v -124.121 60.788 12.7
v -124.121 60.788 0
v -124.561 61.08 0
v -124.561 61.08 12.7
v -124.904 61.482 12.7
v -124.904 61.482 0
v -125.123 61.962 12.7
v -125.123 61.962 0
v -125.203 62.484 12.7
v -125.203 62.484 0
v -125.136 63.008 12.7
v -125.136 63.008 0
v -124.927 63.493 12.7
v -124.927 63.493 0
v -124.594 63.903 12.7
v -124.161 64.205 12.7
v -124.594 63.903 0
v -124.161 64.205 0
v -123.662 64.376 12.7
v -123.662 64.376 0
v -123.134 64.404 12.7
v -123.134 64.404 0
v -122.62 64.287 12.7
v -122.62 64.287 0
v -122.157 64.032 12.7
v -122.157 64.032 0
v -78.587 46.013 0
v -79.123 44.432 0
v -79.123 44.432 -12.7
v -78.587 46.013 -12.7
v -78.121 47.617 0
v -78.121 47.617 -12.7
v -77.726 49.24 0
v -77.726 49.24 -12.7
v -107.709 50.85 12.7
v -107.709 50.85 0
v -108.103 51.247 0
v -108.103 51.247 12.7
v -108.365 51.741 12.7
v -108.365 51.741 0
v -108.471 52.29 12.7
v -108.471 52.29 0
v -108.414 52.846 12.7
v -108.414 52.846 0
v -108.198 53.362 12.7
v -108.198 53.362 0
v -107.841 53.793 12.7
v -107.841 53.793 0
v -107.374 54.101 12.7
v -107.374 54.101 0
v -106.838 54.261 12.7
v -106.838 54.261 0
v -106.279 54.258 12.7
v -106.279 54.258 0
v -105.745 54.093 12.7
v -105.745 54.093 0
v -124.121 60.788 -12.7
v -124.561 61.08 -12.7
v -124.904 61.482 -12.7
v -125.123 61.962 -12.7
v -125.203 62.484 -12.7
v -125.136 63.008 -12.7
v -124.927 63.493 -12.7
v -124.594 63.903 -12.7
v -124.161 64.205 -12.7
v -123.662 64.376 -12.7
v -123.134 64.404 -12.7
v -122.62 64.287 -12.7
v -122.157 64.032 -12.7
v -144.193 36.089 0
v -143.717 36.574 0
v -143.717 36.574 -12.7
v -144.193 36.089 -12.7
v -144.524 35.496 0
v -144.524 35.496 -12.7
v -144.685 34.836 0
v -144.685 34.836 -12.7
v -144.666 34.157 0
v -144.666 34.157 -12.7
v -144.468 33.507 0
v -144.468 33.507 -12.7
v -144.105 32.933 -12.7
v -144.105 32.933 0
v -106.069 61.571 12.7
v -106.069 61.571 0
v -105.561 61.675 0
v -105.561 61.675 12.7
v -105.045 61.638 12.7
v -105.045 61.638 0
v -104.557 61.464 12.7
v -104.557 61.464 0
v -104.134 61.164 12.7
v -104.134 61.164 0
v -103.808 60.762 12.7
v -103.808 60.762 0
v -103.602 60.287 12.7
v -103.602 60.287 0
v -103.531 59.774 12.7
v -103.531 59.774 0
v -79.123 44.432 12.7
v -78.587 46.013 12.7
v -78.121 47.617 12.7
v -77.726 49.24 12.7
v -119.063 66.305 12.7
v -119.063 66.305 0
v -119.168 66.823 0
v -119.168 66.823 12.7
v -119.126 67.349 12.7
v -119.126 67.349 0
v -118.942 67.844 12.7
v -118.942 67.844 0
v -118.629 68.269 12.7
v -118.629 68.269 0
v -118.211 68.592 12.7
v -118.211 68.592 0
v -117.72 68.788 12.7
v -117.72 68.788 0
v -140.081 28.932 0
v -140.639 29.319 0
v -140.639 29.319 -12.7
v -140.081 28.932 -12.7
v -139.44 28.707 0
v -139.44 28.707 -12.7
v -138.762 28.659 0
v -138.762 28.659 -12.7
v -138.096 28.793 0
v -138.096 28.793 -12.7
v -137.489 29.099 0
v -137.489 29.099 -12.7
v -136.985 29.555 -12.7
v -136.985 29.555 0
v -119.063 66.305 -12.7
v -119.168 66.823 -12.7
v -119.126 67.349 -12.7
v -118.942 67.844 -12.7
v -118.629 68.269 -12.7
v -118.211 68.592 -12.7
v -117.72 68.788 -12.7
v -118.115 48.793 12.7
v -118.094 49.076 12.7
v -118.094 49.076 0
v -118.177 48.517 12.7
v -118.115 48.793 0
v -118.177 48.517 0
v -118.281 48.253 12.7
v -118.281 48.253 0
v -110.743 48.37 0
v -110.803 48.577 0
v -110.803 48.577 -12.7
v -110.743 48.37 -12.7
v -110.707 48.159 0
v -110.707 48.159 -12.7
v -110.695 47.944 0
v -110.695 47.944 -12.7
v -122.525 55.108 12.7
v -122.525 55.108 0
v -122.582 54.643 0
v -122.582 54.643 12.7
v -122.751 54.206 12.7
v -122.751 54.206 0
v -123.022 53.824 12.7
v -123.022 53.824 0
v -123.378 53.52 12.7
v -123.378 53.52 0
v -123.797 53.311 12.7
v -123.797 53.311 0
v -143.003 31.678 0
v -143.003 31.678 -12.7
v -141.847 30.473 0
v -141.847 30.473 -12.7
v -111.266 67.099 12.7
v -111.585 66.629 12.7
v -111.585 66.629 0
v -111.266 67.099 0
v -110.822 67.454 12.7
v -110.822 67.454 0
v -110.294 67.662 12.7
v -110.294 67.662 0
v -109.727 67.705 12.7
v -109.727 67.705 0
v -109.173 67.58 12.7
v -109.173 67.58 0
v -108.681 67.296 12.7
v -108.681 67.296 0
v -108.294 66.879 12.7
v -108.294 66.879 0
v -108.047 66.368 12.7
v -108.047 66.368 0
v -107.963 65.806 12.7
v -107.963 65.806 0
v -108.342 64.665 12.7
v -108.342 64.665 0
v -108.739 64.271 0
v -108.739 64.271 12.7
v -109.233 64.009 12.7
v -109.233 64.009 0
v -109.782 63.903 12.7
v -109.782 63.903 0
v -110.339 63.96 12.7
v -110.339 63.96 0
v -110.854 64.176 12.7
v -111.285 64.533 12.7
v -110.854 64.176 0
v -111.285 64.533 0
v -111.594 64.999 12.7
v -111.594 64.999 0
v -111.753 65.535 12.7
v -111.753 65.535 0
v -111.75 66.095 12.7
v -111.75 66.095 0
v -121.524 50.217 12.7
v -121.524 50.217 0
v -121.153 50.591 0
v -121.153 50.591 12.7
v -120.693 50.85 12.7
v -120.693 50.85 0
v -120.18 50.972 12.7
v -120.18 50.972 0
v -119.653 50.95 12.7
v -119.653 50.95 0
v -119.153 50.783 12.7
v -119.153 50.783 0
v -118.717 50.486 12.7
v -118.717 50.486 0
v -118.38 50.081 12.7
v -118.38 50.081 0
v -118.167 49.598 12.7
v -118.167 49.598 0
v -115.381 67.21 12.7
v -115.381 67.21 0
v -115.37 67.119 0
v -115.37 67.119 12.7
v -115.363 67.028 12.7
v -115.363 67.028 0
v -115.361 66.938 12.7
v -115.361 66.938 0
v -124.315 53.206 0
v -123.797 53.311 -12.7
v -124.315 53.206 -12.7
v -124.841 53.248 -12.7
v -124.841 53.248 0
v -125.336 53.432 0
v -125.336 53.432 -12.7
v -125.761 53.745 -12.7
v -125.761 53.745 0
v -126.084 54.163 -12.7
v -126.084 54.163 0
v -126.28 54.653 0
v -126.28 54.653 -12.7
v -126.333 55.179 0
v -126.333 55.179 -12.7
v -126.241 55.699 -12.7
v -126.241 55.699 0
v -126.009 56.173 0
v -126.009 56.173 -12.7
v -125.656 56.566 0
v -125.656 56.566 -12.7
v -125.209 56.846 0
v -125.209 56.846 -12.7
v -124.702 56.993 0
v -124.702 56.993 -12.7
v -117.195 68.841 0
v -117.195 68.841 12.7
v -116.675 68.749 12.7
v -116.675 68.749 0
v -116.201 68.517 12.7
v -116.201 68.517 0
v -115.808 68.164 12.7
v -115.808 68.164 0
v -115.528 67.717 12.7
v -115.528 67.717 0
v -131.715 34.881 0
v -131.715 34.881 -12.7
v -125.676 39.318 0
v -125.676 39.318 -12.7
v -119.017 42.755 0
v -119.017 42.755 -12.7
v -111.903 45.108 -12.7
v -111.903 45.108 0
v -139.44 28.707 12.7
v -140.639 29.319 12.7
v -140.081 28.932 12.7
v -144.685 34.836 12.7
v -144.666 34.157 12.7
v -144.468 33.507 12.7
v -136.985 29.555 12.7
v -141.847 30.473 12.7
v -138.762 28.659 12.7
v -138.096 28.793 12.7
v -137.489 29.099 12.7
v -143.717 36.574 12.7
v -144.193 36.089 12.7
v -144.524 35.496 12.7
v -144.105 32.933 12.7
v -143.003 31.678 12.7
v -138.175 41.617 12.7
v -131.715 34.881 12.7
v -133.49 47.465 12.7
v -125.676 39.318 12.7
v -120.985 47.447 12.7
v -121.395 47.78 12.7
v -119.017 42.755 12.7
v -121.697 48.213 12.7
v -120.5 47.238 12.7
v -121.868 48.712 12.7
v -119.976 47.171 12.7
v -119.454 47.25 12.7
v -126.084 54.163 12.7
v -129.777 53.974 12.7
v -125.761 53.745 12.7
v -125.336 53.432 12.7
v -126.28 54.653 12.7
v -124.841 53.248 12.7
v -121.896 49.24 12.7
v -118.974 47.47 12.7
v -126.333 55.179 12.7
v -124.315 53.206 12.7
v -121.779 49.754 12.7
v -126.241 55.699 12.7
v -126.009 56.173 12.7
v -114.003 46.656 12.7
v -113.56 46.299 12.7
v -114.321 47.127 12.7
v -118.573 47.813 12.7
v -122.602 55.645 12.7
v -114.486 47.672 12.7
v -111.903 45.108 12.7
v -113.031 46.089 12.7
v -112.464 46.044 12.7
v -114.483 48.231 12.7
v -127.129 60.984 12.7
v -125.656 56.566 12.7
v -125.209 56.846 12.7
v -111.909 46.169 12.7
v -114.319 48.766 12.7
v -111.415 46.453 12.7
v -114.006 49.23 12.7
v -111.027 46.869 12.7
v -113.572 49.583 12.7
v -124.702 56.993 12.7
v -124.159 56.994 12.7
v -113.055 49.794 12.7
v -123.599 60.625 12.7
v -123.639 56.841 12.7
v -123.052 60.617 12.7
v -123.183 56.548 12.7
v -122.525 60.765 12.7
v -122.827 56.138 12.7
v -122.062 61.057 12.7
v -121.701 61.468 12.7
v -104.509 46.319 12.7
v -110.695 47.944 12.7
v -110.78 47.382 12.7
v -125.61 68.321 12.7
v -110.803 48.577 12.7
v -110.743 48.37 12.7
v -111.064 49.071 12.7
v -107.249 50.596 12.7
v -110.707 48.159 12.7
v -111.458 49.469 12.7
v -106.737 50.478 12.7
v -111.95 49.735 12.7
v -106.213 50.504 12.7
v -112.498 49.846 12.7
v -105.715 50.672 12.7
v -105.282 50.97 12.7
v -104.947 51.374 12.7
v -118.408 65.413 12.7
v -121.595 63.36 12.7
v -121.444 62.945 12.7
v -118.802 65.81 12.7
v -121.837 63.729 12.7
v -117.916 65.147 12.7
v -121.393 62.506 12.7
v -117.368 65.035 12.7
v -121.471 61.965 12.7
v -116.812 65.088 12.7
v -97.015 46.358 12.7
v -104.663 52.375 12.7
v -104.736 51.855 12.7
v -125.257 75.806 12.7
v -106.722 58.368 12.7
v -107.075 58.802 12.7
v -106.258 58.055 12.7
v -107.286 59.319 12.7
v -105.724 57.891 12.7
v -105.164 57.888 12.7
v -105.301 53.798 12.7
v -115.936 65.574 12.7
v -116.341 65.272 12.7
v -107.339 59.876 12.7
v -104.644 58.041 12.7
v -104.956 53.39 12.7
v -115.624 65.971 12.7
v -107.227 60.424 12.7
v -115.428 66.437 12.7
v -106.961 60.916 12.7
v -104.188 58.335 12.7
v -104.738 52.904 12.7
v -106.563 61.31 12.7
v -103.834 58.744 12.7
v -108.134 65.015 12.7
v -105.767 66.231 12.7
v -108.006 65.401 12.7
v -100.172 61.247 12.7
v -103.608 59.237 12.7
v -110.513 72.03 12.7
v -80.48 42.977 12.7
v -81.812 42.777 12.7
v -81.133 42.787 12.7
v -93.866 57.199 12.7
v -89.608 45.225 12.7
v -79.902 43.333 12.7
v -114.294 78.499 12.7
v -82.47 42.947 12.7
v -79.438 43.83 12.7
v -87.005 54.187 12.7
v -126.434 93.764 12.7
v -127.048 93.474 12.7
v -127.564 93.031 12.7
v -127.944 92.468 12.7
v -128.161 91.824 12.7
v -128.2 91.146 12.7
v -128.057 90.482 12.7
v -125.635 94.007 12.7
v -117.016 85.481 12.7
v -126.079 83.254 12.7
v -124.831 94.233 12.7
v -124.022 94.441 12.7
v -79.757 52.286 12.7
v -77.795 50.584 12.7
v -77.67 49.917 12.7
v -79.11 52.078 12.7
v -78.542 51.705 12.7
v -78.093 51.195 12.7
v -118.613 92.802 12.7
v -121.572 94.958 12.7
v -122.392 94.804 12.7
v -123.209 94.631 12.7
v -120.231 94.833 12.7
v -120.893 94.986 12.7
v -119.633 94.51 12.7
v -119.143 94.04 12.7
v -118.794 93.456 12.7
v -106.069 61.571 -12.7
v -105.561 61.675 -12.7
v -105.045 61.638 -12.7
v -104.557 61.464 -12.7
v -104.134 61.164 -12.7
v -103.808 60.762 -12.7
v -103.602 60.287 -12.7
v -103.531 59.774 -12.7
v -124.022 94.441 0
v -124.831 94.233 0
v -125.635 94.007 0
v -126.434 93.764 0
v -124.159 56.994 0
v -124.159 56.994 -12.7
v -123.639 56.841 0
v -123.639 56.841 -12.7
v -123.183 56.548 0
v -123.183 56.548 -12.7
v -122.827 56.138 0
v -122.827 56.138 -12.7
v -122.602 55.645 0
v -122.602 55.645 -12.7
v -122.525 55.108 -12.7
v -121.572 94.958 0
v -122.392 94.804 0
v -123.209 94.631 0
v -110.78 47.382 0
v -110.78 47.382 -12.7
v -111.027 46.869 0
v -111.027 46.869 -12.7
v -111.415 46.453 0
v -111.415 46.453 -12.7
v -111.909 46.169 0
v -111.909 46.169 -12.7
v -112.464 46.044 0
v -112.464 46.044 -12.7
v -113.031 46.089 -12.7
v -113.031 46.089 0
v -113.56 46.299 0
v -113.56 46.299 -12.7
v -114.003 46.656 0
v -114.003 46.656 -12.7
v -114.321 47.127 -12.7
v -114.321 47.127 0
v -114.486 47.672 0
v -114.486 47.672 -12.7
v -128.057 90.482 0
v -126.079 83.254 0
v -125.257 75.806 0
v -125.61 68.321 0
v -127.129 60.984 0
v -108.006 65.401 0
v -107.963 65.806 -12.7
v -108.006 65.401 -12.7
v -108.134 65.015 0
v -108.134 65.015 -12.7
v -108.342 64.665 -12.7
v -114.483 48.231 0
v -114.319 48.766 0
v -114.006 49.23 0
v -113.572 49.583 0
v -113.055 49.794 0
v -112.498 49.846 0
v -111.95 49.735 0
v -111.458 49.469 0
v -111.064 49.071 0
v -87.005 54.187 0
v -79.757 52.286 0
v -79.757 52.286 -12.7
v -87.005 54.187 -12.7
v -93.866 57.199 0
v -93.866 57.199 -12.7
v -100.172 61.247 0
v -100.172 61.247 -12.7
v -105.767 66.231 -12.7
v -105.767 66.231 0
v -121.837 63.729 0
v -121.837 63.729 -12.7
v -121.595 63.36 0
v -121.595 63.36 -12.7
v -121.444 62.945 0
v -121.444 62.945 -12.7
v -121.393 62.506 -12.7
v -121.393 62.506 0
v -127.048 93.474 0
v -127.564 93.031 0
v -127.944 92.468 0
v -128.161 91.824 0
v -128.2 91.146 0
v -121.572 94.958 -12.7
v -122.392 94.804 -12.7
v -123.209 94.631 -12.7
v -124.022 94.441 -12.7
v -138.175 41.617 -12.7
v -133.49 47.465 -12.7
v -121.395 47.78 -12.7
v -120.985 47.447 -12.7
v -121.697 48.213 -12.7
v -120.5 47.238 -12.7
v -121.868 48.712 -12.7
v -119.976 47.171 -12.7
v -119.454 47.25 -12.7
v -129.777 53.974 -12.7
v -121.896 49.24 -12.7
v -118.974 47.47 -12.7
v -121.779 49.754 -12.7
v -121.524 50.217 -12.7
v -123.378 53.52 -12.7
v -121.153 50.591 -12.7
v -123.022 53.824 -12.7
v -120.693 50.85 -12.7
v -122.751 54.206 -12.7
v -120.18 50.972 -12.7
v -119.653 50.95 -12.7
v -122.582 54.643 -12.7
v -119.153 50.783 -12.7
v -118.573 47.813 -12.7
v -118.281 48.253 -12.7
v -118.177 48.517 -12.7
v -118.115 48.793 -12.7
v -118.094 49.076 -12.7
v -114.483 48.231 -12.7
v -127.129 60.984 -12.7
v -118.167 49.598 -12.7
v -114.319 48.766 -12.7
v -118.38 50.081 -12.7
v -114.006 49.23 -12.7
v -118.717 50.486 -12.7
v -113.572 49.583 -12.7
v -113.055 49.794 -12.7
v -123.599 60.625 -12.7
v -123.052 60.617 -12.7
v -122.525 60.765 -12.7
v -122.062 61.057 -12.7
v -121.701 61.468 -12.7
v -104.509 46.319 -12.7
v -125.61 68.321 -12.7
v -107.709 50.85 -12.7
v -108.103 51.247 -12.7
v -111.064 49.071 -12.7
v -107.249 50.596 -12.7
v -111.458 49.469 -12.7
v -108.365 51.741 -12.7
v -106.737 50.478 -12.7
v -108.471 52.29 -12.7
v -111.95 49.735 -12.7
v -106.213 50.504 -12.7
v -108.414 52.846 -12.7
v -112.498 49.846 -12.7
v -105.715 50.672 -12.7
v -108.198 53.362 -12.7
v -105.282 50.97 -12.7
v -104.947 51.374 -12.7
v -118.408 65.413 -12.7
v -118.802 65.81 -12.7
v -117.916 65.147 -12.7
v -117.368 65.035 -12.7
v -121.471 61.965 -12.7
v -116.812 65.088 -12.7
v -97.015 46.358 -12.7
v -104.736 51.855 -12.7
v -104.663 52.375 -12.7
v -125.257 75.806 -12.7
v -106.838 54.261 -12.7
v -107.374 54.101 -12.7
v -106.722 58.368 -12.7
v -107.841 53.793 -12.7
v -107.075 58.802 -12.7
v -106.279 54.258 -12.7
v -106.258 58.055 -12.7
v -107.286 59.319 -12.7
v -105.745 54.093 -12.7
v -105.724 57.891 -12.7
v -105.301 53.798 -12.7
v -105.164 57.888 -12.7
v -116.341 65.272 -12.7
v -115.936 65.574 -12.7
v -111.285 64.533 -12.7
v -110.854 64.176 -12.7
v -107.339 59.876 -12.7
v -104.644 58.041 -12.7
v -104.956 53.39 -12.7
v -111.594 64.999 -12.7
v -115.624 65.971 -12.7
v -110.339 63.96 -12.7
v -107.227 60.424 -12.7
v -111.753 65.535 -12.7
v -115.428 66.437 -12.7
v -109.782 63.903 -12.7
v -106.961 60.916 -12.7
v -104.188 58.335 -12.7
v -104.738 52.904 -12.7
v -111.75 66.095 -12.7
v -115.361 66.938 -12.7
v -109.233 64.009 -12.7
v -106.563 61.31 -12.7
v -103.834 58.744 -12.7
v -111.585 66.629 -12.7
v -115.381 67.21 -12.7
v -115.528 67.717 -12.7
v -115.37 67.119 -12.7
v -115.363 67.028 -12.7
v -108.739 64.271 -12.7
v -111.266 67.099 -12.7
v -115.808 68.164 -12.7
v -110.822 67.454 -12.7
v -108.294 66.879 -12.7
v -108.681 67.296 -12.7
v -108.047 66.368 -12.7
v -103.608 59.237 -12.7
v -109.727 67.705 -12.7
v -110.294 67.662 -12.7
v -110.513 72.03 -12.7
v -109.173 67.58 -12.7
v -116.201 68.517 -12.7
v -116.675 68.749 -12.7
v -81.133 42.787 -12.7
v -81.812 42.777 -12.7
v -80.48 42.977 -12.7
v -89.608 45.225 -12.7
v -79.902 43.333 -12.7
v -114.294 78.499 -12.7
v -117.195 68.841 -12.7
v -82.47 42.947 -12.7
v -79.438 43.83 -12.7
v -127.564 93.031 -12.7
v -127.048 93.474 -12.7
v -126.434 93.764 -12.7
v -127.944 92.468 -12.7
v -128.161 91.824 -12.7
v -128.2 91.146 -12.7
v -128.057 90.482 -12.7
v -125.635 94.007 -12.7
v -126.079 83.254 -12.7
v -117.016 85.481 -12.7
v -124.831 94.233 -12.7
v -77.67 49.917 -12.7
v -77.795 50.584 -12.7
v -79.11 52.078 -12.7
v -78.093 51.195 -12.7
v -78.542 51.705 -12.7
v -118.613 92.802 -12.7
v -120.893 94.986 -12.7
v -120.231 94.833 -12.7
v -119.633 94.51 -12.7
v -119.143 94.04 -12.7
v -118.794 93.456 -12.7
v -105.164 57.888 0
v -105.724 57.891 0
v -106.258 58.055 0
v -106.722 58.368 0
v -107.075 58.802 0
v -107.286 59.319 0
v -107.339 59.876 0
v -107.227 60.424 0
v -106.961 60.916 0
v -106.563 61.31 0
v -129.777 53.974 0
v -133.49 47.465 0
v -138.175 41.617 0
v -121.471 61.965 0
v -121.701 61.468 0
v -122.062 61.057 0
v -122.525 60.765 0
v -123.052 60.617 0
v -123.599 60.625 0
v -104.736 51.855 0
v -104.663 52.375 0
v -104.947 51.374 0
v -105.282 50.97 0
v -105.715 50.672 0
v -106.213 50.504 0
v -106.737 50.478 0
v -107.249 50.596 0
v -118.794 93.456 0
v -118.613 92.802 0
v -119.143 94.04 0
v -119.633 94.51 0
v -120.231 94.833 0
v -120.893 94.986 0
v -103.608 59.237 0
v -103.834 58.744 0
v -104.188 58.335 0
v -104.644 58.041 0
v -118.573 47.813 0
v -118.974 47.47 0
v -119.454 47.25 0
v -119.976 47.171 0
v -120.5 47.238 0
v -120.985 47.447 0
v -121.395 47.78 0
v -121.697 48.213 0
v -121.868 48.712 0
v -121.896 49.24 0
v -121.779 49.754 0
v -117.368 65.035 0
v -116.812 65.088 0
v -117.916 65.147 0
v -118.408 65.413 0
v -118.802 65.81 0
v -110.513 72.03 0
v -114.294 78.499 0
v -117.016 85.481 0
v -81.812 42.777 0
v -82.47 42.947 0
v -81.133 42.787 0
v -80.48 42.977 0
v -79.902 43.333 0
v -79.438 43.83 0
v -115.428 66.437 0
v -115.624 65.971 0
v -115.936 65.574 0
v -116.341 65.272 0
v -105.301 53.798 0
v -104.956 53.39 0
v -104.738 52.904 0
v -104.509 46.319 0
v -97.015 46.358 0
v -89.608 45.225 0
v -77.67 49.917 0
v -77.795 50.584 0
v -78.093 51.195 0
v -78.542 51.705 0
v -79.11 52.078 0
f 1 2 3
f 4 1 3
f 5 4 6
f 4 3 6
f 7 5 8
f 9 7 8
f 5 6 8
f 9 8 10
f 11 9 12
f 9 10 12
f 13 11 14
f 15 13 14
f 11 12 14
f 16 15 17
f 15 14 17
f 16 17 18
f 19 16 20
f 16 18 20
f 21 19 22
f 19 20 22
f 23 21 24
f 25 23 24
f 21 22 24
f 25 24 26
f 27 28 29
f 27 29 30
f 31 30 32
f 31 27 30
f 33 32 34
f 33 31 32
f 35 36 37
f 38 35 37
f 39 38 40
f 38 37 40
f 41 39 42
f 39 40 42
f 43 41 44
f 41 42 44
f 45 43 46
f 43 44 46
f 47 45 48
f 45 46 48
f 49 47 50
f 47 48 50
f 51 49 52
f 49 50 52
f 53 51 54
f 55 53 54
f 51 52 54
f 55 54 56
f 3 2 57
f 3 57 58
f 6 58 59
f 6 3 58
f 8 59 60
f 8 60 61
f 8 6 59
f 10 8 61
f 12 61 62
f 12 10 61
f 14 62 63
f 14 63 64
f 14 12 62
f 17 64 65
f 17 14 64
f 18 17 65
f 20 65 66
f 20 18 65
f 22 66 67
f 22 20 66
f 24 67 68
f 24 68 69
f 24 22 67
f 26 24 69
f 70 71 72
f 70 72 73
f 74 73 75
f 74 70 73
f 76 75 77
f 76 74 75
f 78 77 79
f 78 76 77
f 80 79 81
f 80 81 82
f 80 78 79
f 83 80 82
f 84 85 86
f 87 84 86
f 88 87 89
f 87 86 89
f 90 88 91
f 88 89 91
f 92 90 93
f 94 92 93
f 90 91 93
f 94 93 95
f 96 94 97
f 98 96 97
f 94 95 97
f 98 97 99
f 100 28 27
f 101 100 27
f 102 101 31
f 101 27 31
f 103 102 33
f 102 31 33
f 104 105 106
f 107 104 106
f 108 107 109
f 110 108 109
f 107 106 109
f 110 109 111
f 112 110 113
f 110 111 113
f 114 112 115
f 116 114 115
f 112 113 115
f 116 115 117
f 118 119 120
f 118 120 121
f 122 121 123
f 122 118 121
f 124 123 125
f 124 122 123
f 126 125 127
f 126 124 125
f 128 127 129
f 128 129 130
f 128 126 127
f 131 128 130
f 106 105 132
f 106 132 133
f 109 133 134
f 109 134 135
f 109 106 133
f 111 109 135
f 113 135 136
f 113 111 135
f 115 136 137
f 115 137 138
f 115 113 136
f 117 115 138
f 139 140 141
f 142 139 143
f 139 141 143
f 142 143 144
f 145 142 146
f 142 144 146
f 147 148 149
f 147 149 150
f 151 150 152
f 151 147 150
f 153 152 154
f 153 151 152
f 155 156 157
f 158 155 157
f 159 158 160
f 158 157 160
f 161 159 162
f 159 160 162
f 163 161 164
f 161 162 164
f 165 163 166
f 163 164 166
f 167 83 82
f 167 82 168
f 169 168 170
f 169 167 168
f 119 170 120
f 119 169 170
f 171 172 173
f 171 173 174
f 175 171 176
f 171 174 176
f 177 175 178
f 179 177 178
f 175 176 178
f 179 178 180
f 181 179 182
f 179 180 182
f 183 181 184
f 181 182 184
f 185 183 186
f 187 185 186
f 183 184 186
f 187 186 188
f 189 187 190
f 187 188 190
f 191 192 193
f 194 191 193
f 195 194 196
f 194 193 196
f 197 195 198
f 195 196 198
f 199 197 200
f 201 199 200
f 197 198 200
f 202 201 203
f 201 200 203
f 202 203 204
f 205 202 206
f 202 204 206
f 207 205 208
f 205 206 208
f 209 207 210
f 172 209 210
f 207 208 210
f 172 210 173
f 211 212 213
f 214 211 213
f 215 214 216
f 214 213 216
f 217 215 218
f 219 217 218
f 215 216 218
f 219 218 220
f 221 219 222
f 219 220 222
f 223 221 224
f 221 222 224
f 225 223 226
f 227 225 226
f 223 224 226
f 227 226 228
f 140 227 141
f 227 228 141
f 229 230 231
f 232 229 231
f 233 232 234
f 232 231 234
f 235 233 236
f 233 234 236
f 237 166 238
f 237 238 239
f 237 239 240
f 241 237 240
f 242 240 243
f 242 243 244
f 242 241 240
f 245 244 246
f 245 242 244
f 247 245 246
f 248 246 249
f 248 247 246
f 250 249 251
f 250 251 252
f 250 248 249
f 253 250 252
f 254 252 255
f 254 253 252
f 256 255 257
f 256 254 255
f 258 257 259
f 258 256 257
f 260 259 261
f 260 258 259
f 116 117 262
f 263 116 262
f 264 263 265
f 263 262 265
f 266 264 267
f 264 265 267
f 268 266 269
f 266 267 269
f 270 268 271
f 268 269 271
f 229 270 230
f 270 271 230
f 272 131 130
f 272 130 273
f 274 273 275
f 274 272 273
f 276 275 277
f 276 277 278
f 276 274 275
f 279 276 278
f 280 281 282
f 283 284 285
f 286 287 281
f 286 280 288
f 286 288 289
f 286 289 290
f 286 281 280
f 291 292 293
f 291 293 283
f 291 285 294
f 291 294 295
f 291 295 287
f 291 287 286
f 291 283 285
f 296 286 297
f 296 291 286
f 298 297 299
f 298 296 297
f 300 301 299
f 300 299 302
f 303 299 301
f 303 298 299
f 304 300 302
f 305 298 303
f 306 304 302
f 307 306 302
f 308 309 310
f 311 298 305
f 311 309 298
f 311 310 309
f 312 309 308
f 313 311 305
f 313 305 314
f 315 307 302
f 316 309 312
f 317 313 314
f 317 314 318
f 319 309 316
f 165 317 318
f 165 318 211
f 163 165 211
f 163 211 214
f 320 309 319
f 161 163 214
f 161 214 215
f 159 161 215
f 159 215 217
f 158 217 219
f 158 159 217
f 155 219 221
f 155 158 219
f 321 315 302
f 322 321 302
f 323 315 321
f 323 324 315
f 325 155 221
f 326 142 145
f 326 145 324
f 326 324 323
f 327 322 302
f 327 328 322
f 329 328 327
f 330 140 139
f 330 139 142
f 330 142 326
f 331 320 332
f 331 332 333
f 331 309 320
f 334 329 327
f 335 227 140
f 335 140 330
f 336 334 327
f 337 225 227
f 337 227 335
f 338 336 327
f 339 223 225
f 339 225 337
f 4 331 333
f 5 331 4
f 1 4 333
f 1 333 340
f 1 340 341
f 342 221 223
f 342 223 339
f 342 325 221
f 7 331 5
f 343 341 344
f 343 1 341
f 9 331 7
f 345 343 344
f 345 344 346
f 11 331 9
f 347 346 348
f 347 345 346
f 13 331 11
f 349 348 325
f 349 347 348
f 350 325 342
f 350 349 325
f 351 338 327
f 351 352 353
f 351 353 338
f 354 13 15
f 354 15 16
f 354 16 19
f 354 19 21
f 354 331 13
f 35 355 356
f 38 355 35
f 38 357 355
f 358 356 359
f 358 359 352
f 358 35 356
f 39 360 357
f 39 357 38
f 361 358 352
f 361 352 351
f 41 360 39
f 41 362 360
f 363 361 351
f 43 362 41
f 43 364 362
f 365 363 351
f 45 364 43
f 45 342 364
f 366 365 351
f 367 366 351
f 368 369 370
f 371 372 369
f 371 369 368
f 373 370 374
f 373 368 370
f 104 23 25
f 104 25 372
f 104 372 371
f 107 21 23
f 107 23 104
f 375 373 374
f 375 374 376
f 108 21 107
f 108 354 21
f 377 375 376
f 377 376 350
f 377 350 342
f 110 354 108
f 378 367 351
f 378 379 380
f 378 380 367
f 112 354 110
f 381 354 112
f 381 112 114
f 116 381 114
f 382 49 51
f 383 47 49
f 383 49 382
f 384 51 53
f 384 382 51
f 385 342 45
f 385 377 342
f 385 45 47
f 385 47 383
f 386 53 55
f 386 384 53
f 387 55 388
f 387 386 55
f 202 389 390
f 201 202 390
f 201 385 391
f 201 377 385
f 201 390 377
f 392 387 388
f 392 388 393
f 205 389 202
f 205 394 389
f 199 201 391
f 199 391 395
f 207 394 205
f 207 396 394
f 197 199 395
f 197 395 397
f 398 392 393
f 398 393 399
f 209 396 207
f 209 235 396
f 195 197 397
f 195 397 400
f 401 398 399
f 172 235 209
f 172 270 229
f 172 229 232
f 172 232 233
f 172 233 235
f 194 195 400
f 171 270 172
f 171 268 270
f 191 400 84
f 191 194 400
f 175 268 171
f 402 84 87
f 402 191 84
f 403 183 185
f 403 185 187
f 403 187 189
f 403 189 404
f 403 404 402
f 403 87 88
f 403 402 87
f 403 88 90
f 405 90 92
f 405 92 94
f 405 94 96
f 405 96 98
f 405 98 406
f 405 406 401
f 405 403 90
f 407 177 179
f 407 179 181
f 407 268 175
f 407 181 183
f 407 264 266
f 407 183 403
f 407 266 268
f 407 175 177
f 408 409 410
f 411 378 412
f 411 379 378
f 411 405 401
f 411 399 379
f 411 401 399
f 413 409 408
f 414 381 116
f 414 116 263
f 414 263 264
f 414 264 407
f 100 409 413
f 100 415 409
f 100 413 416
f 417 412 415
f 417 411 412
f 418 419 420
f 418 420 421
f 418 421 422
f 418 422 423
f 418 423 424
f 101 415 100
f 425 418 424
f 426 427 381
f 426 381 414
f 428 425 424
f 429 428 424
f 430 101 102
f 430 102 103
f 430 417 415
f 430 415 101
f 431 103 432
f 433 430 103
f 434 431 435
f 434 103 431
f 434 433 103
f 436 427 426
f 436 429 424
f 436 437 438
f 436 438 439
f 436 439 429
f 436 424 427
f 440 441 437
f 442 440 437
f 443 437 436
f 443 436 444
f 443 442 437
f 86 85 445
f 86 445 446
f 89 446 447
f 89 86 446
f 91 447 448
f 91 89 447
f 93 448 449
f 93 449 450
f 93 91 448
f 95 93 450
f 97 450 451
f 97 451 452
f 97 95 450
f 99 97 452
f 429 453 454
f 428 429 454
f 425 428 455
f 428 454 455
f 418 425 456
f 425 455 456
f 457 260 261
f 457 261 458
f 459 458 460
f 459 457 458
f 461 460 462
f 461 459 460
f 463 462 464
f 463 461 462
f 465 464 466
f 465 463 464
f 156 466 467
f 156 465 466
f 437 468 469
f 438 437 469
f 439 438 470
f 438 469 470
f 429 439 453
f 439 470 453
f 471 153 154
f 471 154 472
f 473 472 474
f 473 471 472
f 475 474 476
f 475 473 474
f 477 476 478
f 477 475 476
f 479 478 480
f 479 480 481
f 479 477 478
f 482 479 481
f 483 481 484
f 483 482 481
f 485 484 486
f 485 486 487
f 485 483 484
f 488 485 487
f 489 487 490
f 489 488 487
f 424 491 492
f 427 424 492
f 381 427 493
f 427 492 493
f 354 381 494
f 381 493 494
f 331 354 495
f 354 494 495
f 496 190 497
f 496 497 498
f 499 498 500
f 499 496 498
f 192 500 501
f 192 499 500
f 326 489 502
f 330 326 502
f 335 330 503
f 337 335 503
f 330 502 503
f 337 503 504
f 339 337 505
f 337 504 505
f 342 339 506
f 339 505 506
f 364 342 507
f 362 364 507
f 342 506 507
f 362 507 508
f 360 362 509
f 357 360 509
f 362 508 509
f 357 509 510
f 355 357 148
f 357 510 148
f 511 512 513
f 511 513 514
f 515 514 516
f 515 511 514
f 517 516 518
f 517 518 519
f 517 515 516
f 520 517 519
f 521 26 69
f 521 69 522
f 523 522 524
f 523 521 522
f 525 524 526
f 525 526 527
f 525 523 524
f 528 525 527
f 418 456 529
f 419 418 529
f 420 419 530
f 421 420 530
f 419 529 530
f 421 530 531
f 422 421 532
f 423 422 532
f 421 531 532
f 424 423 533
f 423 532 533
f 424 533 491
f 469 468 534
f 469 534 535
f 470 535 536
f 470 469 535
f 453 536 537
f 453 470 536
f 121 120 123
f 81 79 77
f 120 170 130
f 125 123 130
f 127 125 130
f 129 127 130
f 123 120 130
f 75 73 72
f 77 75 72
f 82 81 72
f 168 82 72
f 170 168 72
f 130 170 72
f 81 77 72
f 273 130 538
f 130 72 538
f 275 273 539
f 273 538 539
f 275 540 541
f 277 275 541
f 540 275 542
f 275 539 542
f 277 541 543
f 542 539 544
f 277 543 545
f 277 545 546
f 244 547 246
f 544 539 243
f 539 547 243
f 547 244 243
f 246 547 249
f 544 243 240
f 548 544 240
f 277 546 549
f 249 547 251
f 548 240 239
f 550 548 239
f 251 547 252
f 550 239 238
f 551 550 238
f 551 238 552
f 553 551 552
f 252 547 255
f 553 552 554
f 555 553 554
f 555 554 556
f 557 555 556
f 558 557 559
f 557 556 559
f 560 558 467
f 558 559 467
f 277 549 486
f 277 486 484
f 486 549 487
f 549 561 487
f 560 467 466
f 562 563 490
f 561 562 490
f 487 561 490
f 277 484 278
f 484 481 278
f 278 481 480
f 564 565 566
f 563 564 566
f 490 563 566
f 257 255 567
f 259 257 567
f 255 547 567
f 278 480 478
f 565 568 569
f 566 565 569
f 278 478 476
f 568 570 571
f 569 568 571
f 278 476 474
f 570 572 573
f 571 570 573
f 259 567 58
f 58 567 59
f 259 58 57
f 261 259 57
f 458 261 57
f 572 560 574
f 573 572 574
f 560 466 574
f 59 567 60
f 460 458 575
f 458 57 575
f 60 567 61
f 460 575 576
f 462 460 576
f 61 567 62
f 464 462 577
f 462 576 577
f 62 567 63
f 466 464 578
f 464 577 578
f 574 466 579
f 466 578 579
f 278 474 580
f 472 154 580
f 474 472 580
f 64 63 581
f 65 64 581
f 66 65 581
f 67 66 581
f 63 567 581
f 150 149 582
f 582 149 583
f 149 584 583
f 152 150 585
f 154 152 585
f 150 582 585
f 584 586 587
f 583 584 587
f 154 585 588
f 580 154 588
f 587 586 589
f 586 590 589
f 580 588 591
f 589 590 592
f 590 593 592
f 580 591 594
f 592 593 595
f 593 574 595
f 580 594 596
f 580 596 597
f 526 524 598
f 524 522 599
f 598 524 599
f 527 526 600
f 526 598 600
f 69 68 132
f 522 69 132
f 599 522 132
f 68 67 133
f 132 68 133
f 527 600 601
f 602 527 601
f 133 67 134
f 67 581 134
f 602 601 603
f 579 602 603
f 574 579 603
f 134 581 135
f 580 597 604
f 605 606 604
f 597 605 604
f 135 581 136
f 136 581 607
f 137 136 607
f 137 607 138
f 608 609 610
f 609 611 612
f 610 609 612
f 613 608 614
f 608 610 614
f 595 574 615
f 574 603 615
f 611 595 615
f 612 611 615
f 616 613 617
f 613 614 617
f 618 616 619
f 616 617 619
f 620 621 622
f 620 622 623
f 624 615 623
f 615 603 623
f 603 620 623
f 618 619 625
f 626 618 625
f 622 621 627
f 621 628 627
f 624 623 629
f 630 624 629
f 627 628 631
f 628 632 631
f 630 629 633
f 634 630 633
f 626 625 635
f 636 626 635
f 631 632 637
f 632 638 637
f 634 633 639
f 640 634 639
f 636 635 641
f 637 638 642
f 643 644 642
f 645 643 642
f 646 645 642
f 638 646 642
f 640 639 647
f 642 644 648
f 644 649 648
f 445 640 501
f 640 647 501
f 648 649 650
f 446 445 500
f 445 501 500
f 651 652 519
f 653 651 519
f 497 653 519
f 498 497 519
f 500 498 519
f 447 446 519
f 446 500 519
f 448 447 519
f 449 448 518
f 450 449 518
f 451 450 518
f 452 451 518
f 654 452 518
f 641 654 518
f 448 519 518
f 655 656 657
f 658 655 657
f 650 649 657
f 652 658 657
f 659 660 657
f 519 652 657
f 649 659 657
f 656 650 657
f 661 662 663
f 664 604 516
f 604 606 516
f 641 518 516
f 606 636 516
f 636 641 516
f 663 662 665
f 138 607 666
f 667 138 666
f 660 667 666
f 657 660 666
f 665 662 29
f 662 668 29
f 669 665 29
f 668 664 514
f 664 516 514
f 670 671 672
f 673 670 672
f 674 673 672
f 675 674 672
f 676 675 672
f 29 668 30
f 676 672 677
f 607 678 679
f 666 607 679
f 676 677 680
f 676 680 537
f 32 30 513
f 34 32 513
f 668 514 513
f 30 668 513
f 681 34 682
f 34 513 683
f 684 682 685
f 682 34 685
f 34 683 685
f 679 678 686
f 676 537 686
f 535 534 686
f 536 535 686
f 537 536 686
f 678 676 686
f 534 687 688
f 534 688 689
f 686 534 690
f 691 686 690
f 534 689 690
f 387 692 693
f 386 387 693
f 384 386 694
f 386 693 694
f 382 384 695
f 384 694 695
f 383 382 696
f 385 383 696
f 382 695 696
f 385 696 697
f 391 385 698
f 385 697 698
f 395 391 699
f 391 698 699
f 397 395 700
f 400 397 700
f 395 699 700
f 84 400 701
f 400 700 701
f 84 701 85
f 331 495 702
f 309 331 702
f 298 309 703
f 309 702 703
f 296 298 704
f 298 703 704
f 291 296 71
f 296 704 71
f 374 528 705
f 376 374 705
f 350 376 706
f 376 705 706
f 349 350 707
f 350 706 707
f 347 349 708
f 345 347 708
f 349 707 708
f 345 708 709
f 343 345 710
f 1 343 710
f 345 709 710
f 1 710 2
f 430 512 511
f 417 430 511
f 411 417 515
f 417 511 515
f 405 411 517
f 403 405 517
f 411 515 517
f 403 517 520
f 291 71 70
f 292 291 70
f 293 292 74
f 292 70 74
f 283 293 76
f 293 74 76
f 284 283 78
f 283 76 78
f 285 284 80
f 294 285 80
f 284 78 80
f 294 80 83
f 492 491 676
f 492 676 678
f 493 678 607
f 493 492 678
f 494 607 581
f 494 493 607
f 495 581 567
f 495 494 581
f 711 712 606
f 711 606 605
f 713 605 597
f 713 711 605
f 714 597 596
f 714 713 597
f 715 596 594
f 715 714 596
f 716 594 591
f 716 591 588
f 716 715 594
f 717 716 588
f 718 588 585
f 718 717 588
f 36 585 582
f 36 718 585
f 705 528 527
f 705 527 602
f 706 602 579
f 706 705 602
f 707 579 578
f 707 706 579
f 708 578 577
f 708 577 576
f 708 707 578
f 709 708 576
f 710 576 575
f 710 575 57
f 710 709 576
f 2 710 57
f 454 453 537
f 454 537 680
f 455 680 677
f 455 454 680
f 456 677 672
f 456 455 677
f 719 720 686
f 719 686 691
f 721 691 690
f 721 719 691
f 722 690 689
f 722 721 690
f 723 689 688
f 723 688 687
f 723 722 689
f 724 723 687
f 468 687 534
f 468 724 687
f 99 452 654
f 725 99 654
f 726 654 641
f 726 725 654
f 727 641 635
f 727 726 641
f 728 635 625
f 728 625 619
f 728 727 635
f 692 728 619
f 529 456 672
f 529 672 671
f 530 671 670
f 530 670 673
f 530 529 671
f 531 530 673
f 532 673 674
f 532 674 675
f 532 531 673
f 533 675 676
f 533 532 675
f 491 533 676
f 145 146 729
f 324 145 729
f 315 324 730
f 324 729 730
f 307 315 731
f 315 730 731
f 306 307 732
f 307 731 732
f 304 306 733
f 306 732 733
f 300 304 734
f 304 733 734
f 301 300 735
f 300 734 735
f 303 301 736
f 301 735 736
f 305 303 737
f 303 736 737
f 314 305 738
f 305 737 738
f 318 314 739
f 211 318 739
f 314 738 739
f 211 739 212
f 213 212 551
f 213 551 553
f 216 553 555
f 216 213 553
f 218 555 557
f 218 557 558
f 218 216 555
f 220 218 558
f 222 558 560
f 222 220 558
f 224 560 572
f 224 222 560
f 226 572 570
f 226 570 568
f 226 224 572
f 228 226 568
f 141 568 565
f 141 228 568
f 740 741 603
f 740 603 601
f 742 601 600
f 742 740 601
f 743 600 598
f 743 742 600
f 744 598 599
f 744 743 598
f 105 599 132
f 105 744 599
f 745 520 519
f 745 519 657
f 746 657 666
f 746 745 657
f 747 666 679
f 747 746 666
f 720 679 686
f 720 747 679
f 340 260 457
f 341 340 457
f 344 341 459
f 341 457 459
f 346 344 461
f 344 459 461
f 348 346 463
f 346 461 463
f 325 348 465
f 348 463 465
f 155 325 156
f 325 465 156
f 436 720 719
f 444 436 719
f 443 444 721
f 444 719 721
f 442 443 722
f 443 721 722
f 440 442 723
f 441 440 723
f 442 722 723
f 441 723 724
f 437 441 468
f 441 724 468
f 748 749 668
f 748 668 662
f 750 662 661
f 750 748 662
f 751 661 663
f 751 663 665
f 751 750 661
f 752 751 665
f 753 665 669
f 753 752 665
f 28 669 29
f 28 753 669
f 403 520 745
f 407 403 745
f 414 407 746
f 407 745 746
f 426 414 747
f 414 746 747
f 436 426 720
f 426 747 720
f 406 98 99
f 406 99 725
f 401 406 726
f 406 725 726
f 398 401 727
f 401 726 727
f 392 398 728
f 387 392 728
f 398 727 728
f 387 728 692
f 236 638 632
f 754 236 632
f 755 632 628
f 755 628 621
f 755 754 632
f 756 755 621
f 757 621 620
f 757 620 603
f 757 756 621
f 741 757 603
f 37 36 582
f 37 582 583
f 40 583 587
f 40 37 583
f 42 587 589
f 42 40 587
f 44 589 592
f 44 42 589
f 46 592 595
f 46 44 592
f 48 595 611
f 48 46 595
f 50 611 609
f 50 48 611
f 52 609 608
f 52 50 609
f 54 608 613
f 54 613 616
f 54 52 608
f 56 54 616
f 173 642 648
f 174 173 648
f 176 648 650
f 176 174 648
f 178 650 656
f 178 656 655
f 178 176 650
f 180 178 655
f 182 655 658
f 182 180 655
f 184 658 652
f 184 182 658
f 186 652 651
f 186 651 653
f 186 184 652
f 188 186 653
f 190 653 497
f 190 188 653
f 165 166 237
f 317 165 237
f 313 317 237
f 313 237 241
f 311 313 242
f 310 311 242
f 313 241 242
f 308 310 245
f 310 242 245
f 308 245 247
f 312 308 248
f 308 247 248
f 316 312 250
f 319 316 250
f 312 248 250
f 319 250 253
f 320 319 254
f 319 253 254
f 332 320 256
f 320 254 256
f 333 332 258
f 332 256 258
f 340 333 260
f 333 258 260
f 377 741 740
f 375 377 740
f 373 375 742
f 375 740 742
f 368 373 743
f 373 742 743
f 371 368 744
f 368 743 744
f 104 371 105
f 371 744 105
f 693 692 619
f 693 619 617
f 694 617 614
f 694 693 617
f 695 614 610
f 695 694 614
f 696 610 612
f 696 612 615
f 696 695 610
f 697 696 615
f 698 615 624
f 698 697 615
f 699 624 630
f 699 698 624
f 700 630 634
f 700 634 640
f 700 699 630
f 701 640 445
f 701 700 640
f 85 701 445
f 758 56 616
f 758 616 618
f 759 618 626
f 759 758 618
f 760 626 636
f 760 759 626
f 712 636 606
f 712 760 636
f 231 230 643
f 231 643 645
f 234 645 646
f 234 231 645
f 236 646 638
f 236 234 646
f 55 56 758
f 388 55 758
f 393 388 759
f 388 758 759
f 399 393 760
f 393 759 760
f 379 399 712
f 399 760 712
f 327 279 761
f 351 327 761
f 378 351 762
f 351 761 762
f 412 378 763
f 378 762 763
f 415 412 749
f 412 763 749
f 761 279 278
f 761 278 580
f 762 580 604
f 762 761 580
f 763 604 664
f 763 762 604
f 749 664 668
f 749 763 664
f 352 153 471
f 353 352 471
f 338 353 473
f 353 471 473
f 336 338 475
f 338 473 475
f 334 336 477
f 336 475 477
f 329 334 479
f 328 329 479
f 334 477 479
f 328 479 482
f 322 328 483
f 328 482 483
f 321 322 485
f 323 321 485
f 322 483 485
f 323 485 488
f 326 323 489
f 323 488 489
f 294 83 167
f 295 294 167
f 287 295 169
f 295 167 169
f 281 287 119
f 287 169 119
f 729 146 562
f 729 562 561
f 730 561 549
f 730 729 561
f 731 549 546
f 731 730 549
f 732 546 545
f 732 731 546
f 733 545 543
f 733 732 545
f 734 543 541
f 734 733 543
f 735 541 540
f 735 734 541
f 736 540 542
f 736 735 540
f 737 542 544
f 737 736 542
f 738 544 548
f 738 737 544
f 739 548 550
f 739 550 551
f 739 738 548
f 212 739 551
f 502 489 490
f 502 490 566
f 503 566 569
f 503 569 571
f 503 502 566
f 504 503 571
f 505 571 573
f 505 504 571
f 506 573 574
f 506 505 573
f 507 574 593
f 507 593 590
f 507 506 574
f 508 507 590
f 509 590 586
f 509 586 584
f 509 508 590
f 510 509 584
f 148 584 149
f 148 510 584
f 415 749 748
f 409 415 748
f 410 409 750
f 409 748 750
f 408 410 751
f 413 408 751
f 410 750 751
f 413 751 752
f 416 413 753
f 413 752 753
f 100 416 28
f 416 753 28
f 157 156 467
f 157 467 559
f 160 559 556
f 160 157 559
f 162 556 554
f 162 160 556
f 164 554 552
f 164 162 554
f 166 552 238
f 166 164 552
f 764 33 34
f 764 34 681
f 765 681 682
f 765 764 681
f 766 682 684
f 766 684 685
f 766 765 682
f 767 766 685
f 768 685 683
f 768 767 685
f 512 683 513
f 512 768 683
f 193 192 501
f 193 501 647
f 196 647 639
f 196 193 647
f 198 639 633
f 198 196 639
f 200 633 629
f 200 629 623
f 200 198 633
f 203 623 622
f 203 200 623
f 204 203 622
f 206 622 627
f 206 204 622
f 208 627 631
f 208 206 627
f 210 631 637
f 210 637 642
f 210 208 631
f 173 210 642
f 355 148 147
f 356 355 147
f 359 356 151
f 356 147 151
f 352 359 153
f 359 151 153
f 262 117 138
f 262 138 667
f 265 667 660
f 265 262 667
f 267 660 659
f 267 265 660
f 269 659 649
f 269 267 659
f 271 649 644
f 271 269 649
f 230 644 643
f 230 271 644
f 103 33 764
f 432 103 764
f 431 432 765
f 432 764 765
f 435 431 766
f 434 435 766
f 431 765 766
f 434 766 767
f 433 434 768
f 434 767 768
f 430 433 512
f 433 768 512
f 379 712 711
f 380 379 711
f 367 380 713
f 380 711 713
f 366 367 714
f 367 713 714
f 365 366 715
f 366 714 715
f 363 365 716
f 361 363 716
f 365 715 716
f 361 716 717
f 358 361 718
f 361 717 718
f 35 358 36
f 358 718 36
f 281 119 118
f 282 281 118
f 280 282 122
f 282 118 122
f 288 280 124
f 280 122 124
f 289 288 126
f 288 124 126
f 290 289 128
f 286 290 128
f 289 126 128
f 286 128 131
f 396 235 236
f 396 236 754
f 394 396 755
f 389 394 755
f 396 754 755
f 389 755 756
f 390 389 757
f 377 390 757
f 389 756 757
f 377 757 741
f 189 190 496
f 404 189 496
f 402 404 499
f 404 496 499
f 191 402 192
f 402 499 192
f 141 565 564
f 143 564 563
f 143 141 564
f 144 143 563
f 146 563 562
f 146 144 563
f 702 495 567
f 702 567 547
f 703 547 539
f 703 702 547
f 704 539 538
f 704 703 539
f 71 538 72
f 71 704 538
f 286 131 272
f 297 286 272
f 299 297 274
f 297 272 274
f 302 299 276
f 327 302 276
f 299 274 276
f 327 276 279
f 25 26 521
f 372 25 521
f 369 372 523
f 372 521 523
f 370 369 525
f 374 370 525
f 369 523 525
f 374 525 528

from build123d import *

# Parameters (mm, degrees)
F1_DEPTH      = 12.7
F1_DEPTH_BACK = 12.7


with BuildPart() as f1:
    # F0 (on Top) → F1 (new body, two sides)
    with BuildSketch(Plane.XY) as f1_sk:
        with BuildLine():
            ThreePointArc((-111.9032161657, 45.1075771975), (-104.9388147825, 49.6046967237), (-102.233028536, 57.4408750939))
            ThreePointArc((-102.233028536, 57.4408750939), (-103.1495920186, 62.1780286527), (-105.7669850463, 66.2314181228))
            ThreePointArc((-105.7669850463, 66.2314181228), (-111.3902737379, 69.6367304735), (-117.9628407751, 69.7741730225))
            ThreePointArc((-117.9628407751, 69.7741730225), (-123.7235718813, 66.6069182803), (-127.1288839844, 60.9836296554))
            ThreePointArc((-127.1288839844, 60.9836296554), (-124.0990716757, 48.6503316999), (-111.9032161657, 45.1075771975))
        make_face()
        with BuildLine():
            ThreePointArc((-119.0629153027, 66.3050093604), (-118.9416645433, 67.8436709883), (-117.720455796, 68.7875091882))
            ThreePointArc((-117.720455796, 68.7875091882), (-116.2009205472, 68.5169653295), (-115.3805191431, 67.2096310616))
            ThreePointArc((-115.3805191431, 67.2096310616), (-113.4541917392, 67.1074092571), (-111.5854100251, 66.6290354813))
            ThreePointArc((-111.5854100251, 66.6290354813), (-109.4453537915, 67.6632905836), (-107.9625390148, 65.8056618162))
            ThreePointArc((-107.9625390148, 65.8056618162), (-108.0598650939, 65.2045461904), (-108.3418985903, 64.6648523252))
            ThreePointArc((-108.3418985903, 64.6648523252), (-107.0520611513, 63.2304514239), (-106.0688942695, 61.5707618605))
            ThreePointArc((-106.0688942695, 61.5707618605), (-104.3354570915, 61.3284924248), (-103.531389131, 59.773830518))
            ThreePointArc((-103.531389131, 59.773830518), (-103.9963531849, 58.526705234), (-105.1642725683, 57.8883657009))
            ThreePointArc((-105.1642725683, 57.8883657009), (-105.1565898795, 57.6646790168), (-105.154028536, 57.4408750939))
            ThreePointArc((-105.154028536, 57.4408750939), (-105.3028711794, 55.7411956283), (-105.7448681486, 54.0932565829))
            ThreePointArc((-105.7448681486, 54.0932565829), (-104.956169881, 53.3903974367), (-104.6632418137, 52.3753855727))
            ThreePointArc((-104.6632418137, 52.3753855727), (-105.7150762613, 50.6721141497), (-107.7090513047, 50.8497451481))
            ThreePointArc((-107.7090513047, 50.8497451481), (-109.143452206, 49.5599077092), (-110.8031417694, 48.5767408274))
            ThreePointArc((-110.8031417694, 48.5767408274), (-110.7222846244, 48.2650711548), (-110.6950731119, 47.9442356888))
            ThreePointArc((-110.6950731119, 47.9442356888), (-112.4636646746, 46.0441257609), (-114.485537929, 47.6721191262))
            ThreePointArc((-114.485537929, 47.6721191262), (-116.4118653329, 47.7743409307), (-118.280647047, 48.2527147064))
            ThreePointArc((-118.280647047, 48.2527147064), (-120.9853017302, 47.4465844645), (-121.5241584818, 50.2168978626))
            ThreePointArc((-121.5241584818, 50.2168978626), (-122.8139959207, 51.6512987638), (-123.7971628025, 53.3109883272))
            ThreePointArc((-123.7971628025, 53.3109883272), (-126.2796626303, 54.6534478339), (-124.7017845037, 56.9933844868))
            ThreePointArc((-124.7017845037, 56.9933844868), (-124.5995626992, 58.9197118907), (-124.1211889235, 60.7884936048))
            ThreePointArc((-124.1211889235, 60.7884936048), (-124.9273191654, 63.493148288), (-122.1570057673, 64.0320050396))
            ThreePointArc((-122.1570057673, 64.0320050396), (-120.7226048661, 65.3218424786), (-119.0629153027, 66.3050093604))
        make_face(mode=Mode.SUBTRACT)
        with BuildLine():
            ThreePointArc((-105.7669850463, 66.2314181228), (-103.1495920186, 62.1780286527), (-102.233028536, 57.4408750939))
            ThreePointArc((-102.233028536, 57.4408750939), (-104.9388147825, 49.6046967237), (-111.9032161657, 45.1075771975))
            ThreePointArc((-111.9032161657, 45.1075771975), (-97.0154400661, 46.358254472), (-82.4698502509, 42.9471127619))
            ThreePointArc((-82.4698502509, 42.9471127619), (-80.4804099193, 42.9769764127), (-79.1228638065, 44.4315668094))
            ThreePointArc((-79.1228638065, 44.4315668094), (-78.3454622215, 46.8126113043), (-77.7261887634, 49.2395901865))
            ThreePointArc((-77.7261887634, 49.2395901865), (-78.0931330297, 51.1951250433), (-79.7569486957, 52.2862172026))
            ThreePointArc((-79.7569486957, 52.2862172026), (-93.8663258144, 57.199011108), (-105.7669850463, 66.2314181228))
        make_face()
        with BuildLine():
            ThreePointArc((-136.9851331378, 29.5548252922), (-125.675840017, 39.3175075021), (-111.9032161657, 45.1075771975))
            ThreePointArc((-111.9032161657, 45.1075771975), (-124.0990716757, 48.6503316999), (-127.1288839844, 60.9836296554))
            ThreePointArc((-127.1288839844, 60.9836296554), (-133.4896537424, 47.4650986561), (-143.7165840545, 36.5738191773))
            ThreePointArc((-143.7165840545, 36.5738191773), (-144.6854415401, 34.8359814855), (-144.1045023609, 32.9330168666))
            ThreePointArc((-144.1045023609, 32.9330168666), (-142.4311581332, 31.0692450977), (-140.6389694958, 29.3194491099))
            ThreePointArc((-140.6389694958, 29.3194491099), (-138.7619544987, 28.6594647379), (-136.9851331378, 29.5548252922))
        make_face()
        with BuildLine():
            ThreePointArc((-111.5854100251, 66.6290354813), (-113.4541917392, 67.1074092571), (-115.3805191431, 67.2096310616))
            ThreePointArc((-115.3805191431, 67.2096310616), (-115.3658740322, 67.0739229362), (-115.3609839601, 66.9375144989))
            ThreePointArc((-115.3609839601, 66.9375144989), (-115.7668519034, 65.7620877354), (-116.8115121243, 65.0875198096))
            ThreePointArc((-116.8115121243, 65.0875198096), (-118.1721404496, 65.2618339158), (-119.0629153027, 66.3050093604))
            ThreePointArc((-119.0629153027, 66.3050093604), (-120.7226048661, 65.3218424786), (-122.1570057673, 64.0320050396))
            ThreePointArc((-122.1570057673, 64.0320050396), (-121.5945438354, 63.3595301674), (-121.3928152584, 62.5063646151))
            ThreePointArc((-121.3928152584, 62.5063646151), (-122.2828033944, 60.8942926824), (-124.1211889235, 60.7884936048))
            ThreePointArc((-124.1211889235, 60.7884936048), (-124.5995626992, 58.9197118907), (-124.7017845037, 56.9933844868))
            ThreePointArc((-124.7017845037, 56.9933844868), (-123.182542657, 56.5479556158), (-122.5246679411, 55.1079196698))
            ThreePointArc((-122.5246679411, 55.1079196698), (-122.8750060343, 54.0069876303), (-123.7971628025, 53.3109883272))
            ThreePointArc((-123.7971628025, 53.3109883272), (-122.8139959207, 51.6512987638), (-121.5241584818, 50.2168978626))
            ThreePointArc((-121.5241584818, 50.2168978626), (-119.3974024314, 50.8837622924), (-118.0935180572, 49.0760883715))
            ThreePointArc((-118.0935180572, 49.0760883715), (-118.1408892899, 48.6539031482), (-118.280647047, 48.2527147064))
            ThreePointArc((-118.280647047, 48.2527147064), (-116.4118653329, 47.7743409307), (-114.485537929, 47.6721191262))
            ThreePointArc((-114.485537929, 47.6721191262), (-113.0545449478, 49.7942303781), (-110.8031417694, 48.5767408274))
            ThreePointArc((-110.8031417694, 48.5767408274), (-109.143452206, 49.5599077092), (-107.7090513047, 50.8497451481))
            ThreePointArc((-107.7090513047, 50.8497451481), (-108.1977457206, 53.3621692456), (-105.7448681486, 54.0932565829))
            ThreePointArc((-105.7448681486, 54.0932565829), (-105.3028711794, 55.7411956283), (-105.154028536, 57.4408750939))
            ThreePointArc((-105.154028536, 57.4408750939), (-105.1565898795, 57.6646790168), (-105.1642725683, 57.8883657009))
            ThreePointArc((-105.1642725683, 57.8883657009), (-107.2863838203, 59.3193586821), (-106.0688942695, 61.5707618605))
            ThreePointArc((-106.0688942695, 61.5707618605), (-107.0520611513, 63.2304514239), (-108.3418985903, 64.6648523252))
            ThreePointArc((-108.3418985903, 64.6648523252), (-110.8543226878, 64.1761579093), (-111.5854100251, 66.6290354813))
        make_face()
        with BuildLine():
            ThreePointArc((-117.9628407751, 69.7741730225), (-111.3902737379, 69.6367304735), (-105.7669850463, 66.2314181228))
            ThreePointArc((-105.7669850463, 66.2314181228), (-114.2939916511, 78.4992719445), (-118.6126513027, 92.8016933424))
            ThreePointArc((-118.6126513027, 92.8016933424), (-119.6332341487, 94.5096673835), (-121.5717194408, 94.9580416056))
            ThreePointArc((-121.5717194408, 94.9580416056), (-122.8013442638, 94.7195500651), (-124.0224652534, 94.4407688797))
            Line((-124.0224652534, 94.4407688797), (-117.9628407751, 69.7741730225))
        make_face()
        with BuildLine():
            ThreePointArc((-127.1288839844, 60.9836296554), (-123.7235718813, 66.6069182803), (-117.9628407751, 69.7741730225))
            Line((-117.9628407751, 69.7741730225), (-124.0224652534, 94.4407688797))
            ThreePointArc((-124.0224652534, 94.4407688797), (-125.2337626594, 94.1219993476), (-126.4339273489, 93.7635859852))
            ThreePointArc((-126.4339273489, 93.7635859852), (-127.9439980797, 92.4680355004), (-128.0570037746, 90.4815827868))
            ThreePointArc((-128.0570037746, 90.4815827868), (-125.2569195337, 75.8061065896), (-127.1288839844, 60.9836296554))
        make_face()
    extrude(amount=F1_DEPTH)
    extrude(f1_sk.sketch, amount=-F1_DEPTH_BACK)


solid = f1.part
